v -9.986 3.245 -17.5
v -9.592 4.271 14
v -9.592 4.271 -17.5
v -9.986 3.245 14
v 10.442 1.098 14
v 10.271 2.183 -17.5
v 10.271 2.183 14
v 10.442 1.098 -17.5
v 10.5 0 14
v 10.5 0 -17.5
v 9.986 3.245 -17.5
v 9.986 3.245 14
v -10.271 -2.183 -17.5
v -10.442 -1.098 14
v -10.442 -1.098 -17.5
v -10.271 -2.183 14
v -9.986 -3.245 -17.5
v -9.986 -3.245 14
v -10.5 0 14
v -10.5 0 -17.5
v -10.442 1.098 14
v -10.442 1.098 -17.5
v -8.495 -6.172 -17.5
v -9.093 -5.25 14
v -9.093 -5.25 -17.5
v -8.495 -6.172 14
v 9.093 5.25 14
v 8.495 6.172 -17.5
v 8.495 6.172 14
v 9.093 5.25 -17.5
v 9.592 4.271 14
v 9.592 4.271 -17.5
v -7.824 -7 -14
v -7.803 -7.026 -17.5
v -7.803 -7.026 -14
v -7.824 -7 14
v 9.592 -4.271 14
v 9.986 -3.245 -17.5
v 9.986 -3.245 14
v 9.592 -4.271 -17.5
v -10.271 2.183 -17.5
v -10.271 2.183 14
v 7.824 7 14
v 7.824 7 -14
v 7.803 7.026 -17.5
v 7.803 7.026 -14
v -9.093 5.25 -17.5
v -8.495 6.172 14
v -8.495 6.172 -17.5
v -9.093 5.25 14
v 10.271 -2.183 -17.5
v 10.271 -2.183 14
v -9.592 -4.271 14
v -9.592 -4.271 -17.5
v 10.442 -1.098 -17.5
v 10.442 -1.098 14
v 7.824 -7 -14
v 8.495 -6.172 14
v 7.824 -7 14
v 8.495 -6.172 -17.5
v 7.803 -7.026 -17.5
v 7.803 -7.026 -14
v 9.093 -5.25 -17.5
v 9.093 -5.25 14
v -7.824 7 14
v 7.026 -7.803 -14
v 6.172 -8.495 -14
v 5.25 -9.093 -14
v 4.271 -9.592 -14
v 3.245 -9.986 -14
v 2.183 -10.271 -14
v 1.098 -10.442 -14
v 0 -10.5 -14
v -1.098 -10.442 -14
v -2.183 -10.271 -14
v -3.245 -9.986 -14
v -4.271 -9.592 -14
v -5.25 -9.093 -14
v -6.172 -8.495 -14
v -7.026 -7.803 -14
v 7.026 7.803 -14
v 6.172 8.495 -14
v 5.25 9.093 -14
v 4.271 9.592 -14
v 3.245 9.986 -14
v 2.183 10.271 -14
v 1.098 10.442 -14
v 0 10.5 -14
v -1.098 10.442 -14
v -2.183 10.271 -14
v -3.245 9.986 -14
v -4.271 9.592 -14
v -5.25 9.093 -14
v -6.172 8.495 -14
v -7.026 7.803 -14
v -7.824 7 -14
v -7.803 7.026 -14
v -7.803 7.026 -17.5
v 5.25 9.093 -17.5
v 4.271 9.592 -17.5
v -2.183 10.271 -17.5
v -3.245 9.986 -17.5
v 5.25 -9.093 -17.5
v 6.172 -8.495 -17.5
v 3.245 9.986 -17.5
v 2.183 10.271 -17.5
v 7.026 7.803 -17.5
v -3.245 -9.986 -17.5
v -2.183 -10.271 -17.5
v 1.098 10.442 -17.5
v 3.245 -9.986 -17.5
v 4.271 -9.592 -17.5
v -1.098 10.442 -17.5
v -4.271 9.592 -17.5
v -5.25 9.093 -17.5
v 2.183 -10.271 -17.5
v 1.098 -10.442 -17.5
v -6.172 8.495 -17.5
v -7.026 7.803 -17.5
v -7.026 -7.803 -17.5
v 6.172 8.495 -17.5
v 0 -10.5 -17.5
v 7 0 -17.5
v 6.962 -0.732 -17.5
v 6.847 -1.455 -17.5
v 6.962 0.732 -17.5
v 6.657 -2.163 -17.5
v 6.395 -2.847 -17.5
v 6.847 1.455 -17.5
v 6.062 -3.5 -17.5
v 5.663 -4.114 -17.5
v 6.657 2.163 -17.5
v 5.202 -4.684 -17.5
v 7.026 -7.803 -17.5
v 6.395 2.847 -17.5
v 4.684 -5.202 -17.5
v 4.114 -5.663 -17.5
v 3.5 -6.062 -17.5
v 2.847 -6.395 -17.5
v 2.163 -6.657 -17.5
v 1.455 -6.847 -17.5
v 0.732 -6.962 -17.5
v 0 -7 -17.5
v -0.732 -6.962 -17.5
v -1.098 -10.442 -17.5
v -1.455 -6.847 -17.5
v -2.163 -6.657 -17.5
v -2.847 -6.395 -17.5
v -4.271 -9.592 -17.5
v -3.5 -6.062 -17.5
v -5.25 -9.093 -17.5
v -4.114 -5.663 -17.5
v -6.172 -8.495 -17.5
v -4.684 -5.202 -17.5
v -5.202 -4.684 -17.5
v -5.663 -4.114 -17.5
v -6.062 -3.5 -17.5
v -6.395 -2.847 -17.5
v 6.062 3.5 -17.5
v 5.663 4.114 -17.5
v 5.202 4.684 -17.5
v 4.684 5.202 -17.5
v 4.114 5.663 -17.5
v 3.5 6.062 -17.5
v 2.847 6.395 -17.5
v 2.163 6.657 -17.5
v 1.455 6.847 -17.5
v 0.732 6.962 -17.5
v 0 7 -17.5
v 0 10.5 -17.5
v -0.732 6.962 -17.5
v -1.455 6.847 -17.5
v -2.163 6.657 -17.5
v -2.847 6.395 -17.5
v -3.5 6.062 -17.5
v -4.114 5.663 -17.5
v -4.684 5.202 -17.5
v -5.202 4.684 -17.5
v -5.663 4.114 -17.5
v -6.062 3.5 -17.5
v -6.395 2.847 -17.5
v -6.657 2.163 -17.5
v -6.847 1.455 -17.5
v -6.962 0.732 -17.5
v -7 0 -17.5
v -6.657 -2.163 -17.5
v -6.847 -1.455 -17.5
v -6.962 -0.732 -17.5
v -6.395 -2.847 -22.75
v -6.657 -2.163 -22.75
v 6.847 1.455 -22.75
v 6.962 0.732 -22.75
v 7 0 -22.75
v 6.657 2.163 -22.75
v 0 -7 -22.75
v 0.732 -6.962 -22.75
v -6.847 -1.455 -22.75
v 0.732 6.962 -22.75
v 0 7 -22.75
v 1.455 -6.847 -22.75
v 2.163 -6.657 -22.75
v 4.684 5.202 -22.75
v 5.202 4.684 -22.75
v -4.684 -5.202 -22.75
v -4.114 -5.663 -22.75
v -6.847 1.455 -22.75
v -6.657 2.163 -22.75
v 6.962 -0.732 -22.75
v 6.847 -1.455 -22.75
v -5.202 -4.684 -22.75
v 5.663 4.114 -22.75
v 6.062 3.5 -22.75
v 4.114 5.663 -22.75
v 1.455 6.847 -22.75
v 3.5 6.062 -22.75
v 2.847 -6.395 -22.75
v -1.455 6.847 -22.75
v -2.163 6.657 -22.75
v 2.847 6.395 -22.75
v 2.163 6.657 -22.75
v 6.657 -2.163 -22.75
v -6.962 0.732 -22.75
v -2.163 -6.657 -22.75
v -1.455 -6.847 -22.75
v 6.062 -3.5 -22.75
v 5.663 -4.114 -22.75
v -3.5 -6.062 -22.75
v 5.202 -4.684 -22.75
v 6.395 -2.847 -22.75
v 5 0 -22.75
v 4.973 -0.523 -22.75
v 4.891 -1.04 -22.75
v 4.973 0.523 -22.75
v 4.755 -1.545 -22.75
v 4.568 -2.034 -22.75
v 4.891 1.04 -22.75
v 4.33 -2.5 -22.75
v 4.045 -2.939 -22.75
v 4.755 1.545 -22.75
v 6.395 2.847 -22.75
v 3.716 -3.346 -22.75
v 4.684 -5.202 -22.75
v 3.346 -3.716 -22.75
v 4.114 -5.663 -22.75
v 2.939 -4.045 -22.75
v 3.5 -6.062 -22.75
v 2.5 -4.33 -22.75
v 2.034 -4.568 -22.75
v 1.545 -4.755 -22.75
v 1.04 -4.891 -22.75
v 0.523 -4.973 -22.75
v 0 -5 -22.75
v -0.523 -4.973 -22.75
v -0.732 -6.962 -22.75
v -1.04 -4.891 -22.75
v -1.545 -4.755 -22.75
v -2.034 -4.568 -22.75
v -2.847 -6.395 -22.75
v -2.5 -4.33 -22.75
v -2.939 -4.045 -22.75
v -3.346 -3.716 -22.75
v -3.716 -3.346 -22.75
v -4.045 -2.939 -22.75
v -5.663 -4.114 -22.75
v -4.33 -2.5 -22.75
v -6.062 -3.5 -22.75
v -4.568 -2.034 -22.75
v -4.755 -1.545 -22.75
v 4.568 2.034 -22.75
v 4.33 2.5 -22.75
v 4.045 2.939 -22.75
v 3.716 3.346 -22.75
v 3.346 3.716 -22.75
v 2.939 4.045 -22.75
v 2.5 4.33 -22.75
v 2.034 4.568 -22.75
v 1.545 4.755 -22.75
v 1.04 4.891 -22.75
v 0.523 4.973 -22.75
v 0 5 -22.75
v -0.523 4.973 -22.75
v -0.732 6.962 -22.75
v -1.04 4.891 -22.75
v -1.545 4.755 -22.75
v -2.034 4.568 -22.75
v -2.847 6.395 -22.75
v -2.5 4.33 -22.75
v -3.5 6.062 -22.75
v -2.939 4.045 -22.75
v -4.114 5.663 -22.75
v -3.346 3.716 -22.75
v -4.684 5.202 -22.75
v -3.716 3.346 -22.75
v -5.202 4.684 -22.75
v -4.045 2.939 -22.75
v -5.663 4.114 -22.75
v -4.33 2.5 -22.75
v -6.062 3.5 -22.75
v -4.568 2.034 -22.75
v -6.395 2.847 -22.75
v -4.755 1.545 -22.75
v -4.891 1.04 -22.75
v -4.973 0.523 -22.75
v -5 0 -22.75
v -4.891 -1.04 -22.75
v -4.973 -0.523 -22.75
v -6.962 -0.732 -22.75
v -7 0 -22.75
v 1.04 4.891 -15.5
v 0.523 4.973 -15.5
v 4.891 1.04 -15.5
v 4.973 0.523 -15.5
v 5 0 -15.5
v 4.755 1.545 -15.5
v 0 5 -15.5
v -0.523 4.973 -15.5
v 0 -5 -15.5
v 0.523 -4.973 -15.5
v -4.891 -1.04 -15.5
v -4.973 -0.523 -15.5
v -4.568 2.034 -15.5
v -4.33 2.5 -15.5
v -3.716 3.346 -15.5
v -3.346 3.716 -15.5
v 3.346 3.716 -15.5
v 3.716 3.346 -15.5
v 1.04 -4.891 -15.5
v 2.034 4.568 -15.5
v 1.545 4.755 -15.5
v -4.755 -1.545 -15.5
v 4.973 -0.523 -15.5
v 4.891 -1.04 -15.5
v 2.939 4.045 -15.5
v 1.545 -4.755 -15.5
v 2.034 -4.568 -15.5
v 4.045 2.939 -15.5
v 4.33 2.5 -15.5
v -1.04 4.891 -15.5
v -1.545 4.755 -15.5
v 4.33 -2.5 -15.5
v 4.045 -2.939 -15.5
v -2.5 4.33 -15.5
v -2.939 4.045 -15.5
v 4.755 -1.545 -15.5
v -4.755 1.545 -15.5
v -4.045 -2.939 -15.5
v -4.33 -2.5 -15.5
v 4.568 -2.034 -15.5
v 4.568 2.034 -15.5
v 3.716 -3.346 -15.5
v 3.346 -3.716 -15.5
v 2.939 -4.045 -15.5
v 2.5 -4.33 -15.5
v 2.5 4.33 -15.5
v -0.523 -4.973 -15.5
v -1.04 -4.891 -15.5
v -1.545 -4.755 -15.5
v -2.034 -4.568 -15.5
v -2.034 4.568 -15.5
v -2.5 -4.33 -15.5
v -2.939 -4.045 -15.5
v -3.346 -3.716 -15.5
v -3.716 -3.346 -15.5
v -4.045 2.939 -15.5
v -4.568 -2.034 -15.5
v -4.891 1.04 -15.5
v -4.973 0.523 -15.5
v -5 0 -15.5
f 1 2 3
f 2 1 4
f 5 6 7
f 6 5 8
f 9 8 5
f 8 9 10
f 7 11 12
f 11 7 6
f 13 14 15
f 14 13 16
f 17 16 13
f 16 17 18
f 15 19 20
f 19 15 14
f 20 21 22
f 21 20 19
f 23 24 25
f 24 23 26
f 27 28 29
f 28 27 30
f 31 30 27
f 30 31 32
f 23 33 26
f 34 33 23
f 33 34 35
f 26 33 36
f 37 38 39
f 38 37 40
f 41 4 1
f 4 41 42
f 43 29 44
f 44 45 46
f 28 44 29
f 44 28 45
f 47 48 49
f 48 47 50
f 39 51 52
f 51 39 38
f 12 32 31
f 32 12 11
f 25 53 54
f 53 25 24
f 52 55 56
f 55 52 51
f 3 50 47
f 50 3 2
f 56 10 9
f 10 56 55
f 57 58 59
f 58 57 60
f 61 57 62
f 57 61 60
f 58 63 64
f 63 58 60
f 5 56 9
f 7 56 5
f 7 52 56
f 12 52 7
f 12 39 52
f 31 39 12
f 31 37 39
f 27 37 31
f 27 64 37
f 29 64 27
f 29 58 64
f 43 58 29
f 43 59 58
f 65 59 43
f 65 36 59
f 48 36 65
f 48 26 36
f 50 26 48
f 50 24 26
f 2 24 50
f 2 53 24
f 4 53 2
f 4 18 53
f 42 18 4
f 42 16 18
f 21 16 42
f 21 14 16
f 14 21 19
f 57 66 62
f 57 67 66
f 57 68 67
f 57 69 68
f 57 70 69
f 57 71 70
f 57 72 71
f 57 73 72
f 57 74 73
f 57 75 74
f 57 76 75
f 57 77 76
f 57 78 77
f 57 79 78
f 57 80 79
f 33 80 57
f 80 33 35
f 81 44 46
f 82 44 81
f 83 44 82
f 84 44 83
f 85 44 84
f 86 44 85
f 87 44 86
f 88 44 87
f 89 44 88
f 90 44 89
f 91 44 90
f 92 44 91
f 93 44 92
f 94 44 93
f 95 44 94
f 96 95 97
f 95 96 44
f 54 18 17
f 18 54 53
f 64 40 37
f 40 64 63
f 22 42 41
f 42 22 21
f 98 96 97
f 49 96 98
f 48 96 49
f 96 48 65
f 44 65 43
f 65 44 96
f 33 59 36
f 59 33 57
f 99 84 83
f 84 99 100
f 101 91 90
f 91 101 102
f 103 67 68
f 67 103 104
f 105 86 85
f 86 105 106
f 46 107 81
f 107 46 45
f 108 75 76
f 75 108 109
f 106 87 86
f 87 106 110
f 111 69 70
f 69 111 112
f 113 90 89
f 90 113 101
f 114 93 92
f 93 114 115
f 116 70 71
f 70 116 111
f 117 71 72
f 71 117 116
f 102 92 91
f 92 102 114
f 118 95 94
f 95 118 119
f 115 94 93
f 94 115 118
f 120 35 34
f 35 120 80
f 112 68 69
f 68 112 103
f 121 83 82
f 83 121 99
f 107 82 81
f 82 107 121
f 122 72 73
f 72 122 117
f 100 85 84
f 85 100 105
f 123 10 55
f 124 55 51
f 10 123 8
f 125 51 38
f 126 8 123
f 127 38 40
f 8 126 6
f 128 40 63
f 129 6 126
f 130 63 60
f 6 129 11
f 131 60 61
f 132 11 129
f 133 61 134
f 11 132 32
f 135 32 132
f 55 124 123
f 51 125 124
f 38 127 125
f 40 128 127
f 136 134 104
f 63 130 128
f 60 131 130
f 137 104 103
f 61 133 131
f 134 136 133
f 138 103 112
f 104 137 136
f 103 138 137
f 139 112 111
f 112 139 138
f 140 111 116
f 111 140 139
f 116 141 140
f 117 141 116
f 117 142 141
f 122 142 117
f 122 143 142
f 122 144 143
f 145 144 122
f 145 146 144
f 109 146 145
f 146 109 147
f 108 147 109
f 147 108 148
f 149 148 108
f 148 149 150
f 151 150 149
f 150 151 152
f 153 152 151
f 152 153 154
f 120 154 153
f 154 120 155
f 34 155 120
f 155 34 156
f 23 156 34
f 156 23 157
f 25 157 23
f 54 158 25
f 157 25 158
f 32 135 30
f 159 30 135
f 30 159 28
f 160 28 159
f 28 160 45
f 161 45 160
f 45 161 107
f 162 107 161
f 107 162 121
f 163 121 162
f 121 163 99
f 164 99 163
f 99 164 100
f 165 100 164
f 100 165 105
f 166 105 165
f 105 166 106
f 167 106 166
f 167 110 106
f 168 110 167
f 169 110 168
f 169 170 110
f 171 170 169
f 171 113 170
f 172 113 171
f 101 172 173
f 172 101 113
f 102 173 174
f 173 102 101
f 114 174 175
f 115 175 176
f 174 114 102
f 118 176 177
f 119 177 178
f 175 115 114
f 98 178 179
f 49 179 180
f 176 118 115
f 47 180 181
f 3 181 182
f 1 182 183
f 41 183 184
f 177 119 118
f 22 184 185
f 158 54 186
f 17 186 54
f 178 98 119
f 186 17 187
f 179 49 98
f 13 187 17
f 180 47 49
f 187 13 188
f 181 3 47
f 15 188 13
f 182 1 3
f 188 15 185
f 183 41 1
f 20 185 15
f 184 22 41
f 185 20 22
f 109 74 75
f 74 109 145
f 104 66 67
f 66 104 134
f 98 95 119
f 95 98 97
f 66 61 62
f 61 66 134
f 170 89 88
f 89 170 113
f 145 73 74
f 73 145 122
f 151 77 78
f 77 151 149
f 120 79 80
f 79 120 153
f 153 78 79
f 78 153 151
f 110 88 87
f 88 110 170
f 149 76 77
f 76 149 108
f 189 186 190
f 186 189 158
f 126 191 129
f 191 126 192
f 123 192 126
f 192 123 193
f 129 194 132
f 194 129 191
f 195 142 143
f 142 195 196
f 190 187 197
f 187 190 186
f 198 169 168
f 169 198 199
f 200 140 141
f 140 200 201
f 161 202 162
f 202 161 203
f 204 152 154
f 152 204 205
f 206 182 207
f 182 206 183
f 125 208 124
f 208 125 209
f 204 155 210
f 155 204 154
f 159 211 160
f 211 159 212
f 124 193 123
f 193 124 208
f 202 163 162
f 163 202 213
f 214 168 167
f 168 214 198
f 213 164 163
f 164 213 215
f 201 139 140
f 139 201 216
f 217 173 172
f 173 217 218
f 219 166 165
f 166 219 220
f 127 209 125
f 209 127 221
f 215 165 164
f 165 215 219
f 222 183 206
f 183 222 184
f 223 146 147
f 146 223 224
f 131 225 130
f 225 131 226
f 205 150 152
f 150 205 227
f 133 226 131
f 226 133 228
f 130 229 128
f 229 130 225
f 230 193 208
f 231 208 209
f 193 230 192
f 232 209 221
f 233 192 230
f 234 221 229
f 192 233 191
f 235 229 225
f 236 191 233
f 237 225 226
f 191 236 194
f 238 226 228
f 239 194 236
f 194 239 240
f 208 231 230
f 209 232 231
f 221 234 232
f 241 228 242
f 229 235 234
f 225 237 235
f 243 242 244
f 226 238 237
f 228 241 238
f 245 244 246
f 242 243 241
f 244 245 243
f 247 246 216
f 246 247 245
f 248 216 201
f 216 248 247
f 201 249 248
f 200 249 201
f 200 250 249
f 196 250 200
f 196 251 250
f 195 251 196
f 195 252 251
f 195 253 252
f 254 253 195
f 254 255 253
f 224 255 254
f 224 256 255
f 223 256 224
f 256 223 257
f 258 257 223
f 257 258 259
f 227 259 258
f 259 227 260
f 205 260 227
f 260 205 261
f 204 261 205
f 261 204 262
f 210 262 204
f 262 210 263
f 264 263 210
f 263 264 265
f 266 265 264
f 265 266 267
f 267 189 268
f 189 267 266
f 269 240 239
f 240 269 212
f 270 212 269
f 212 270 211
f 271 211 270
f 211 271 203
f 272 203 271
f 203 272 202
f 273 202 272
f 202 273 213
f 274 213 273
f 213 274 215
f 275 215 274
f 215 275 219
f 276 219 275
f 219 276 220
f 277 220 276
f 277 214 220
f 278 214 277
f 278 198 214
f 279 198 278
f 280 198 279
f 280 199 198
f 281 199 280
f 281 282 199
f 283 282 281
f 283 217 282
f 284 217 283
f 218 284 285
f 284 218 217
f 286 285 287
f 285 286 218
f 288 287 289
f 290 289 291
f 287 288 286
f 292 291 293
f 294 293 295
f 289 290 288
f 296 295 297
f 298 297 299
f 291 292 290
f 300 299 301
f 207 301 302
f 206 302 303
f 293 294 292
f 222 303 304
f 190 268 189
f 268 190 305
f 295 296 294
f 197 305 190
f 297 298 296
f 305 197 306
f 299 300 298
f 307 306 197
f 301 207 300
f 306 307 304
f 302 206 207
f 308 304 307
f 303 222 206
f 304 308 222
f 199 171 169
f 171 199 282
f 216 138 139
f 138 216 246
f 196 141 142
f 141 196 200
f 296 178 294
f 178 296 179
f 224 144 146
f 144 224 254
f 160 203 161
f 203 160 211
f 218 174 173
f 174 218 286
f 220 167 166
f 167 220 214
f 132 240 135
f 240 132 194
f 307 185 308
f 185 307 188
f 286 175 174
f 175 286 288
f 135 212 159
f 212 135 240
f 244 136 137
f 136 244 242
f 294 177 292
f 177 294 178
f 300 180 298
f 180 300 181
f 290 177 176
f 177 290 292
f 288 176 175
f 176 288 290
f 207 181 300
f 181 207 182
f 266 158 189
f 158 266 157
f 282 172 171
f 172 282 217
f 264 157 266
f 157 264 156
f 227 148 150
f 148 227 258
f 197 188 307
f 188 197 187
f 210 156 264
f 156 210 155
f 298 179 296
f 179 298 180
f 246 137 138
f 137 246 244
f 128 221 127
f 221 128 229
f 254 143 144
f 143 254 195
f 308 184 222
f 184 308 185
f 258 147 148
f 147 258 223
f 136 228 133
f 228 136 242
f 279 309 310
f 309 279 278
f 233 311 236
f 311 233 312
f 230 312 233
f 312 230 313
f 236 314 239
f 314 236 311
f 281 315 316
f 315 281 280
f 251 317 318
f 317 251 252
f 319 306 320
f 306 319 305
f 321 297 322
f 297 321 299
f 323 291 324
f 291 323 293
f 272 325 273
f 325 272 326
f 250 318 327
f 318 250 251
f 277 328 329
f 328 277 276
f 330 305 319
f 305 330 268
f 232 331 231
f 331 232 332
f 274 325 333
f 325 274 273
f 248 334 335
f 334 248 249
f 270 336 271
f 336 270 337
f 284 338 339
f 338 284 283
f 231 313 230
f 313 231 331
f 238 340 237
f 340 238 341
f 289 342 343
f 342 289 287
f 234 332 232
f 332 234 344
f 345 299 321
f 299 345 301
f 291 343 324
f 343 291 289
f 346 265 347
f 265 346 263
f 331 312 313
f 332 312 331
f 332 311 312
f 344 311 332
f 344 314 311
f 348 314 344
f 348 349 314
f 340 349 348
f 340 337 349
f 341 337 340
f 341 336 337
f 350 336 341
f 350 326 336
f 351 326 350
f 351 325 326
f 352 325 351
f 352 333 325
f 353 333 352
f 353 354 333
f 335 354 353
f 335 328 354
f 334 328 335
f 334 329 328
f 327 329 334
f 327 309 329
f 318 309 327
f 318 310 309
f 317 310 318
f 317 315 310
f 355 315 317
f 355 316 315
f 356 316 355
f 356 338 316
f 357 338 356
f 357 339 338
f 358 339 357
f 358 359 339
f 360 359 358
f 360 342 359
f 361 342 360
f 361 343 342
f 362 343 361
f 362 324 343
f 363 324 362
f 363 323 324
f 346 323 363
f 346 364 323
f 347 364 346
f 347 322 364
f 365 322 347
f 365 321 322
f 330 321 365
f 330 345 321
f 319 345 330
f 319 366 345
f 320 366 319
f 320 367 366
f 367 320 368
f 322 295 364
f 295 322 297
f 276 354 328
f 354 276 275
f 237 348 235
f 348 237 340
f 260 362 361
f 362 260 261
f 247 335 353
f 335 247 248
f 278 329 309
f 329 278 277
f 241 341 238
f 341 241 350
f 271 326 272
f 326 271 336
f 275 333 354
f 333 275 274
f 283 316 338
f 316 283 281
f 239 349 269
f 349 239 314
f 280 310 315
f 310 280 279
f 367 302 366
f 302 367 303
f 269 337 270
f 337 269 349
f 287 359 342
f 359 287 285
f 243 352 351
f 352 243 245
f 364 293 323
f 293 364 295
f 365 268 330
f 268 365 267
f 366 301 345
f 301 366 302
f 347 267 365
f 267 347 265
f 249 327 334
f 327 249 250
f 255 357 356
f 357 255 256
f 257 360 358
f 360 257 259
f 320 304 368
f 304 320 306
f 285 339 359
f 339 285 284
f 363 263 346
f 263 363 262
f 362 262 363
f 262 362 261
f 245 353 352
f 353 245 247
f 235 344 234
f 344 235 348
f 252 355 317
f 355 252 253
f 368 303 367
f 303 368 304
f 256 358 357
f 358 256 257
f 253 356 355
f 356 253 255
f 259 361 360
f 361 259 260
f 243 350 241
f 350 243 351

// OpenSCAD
// =========================================================
// OpenSCAD Code: 100mm 圓柱體切割成半圓柱 (Half Cylinder)
// =========================================================

// 引用螺紋庫，確保 threads.scad 檔案位於同一目錄或 OpenSCAD 庫路徑中
include <threads.scad>

// 設定曲面平滑度 (數值越大越平滑，但渲染較慢)
$fn = 60;

// --- 尺寸變數 ---
cylinder_length = 28; // 圓柱體長度
outer_radius = 21/2;      // 圓柱體半徑
handle_wdith = 14;
hat_length = 3.5;
bottom_length = 7;

inner_thread_diameter = 10;
inner_thread_pitch = 1.25;
inner_thread_length = 7.5;

hole_radius = inner_thread_diameter/2;      // 圓柱體半徑
hole_length = inner_thread_length;

// Toggle: Set to false for instant previews (plain cylinders), true for threaded STL
use_detailed_threads = false;  // Change to false for quick tests

module threaded_section(diam, pitch, len, z_pos) {
    if (use_detailed_threads) {
        translate([0, 0, z_pos])
            metric_thread(diameter=diam, pitch=pitch, length=len, internal=true);
    } else {
        // Plain cylinder approximation (fast, no helix)
        translate([0, 0, z_pos])
            cylinder(h=len, r=diam/2, center = true);
    }
}



difference() {

  union() {
    // --- Hat ---

    translate([0, 0, -cylinder_length/2 -hat_length/2])
        cylinder(
            h = hat_length,
            r = outer_radius,
            center = true
        );

    translate([0, 0, -cylinder_length/2 -hat_length/2 -bottom_length/2])
        cylinder(
            h = bottom_length,
            r = handle_wdith/2,
            center = true
        );


    // --- Handle ---
    difference() {

        // 1. 主要圓柱體 (Main Cylinder)
        // 圓柱體長度為100，半徑為5。
        // center=true 使圓柱體中心位於 [0, 0, 0]，沿著 Z 軸延伸。
        cylinder(
            h = cylinder_length,
            r = outer_radius,
            center = true
        );


        // 2. 切割用的立方體 (The Cutter/Box)
        // 我們需要一個足夠大的立方體來切掉圓柱體的「上半部」（Y > handle_wdith/2 的部分）。

        // 定義立方體尺寸：
        // X軸：略大於直徑 (10 + 2 = 12)
        // Y軸：略大於半徑 (5 + 1 = 6)
        // Z軸：等於圓柱體長度 (100)

        // 將立方體移動到正確的切割位置：
        // 為了讓立方體的底部邊緣精確對齊圓柱體的中心軸 (Z軸)，
        // 我們將其中心點從 [0, 0, 0] 移動到 [X_offset, Y_offset, Z_offset]。
        translate(v = [-outer_radius - 1, handle_wdith/2, -cylinder_length/2])
        {
            // 立方體從 Y=0 開始向正 Y 方向延伸，完美覆蓋圓柱體的上半部。
            cube(
                size = [outer_radius * 2 + 2, outer_radius + 1, cylinder_length]
            );
        }


        // 3. 切割用的立方體 (The Cutter/Box)
        // 我們需要一個足夠大的立方體來切掉圓柱體的「上半部」（Y < handle_wdith/2的部分）。

        // 定義立方體尺寸：
        // X軸：略大於直徑 (10 + 2 = 12)
        // Y軸：略大於半徑 (5 + 1 = 6)
        // Z軸：等於圓柱體長度 (100)

        // 將立方體移動到正確的切割位置：
        // 為了讓立方體的底部邊緣精確對齊圓柱體的中心軸 (Z軸)，
        // 我們將其中心點從 [0, 0, 0] 移動到 [X_offset, Y_offset, Z_offset]。
        translate(v = [-outer_radius - 1, -(outer_radius + 1)- (handle_wdith/2), -cylinder_length/2])
        {
            // 立方體從 Y=0 開始向正 Y 方向延伸，完美覆蓋圓柱體的上半部。
            cube(
                size = [outer_radius * 2 + 2, outer_radius + 1, cylinder_length]
            );
        }
        
    }
    
  }


  threaded_section(inner_thread_diameter, inner_thread_pitch, inner_thread_length, -cylinder_length/2 -hat_length/2 -bottom_length/2);

/*  
  translate([0, 0, -cylinder_length/2 -hat_length/2 -bottom_length/2]) 
  {


  
      // 1. use hole
      cylinder(
          h = hole_length,
          r = hole_radius,
          center = true
      );

      // 2. use thread
      
      // 內螺紋切割體 (The Internal Thread Cutter)
      // metric_thread 函式來自 threads.scad 庫
      // diameter=10, pitch=1.25
      // internal=true 表示這個螺紋是「挖孔」用的螺紋形狀
      metric_thread(
          diameter = inner_thread_diameter,
          pitch = inner_thread_pitch,
          length = inner_thread_length, // 螺紋貫穿整個長度
          internal = true,         // 產生內螺紋切割體
          center = true            // 與主體圓柱體在 Z 軸上對齊
      );
      
  }
  
*/
  
}
